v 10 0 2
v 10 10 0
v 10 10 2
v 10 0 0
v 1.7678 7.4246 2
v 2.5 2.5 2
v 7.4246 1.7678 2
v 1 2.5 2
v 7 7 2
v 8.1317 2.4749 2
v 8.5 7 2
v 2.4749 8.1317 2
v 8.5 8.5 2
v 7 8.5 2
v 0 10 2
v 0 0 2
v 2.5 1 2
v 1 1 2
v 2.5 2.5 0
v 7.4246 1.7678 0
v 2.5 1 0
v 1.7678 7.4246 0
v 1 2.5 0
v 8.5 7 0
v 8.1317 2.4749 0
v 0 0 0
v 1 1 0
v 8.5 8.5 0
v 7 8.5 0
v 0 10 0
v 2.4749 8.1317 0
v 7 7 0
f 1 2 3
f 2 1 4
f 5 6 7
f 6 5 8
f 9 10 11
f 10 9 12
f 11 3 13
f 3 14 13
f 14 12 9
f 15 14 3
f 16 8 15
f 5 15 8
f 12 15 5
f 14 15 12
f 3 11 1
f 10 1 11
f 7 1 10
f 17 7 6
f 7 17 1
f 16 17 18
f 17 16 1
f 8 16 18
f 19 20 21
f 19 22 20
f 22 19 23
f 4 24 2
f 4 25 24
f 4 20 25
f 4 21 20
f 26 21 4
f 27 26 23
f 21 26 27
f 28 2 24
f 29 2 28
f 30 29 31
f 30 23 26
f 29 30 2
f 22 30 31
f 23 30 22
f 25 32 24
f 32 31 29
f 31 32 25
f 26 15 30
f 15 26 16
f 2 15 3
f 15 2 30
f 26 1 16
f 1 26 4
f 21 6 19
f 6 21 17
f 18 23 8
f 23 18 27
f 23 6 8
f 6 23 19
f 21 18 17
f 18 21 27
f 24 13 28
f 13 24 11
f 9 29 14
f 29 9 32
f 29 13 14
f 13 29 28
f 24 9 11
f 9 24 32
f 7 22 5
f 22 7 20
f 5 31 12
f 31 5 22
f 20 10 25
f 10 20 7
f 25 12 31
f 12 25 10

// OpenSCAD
$fn=124;
difference() {
cube([10, 10, 2]);
translate([1, 1, -0.5]) cube([1.5, 1.5, 3]);
translate([7, 7, -0.5]) cube([1.5, 1.5, 3]);
rotate([0, 0, 45]) translate([6.5, -4, -0.5]) cube([1, 8, 3]);
}
